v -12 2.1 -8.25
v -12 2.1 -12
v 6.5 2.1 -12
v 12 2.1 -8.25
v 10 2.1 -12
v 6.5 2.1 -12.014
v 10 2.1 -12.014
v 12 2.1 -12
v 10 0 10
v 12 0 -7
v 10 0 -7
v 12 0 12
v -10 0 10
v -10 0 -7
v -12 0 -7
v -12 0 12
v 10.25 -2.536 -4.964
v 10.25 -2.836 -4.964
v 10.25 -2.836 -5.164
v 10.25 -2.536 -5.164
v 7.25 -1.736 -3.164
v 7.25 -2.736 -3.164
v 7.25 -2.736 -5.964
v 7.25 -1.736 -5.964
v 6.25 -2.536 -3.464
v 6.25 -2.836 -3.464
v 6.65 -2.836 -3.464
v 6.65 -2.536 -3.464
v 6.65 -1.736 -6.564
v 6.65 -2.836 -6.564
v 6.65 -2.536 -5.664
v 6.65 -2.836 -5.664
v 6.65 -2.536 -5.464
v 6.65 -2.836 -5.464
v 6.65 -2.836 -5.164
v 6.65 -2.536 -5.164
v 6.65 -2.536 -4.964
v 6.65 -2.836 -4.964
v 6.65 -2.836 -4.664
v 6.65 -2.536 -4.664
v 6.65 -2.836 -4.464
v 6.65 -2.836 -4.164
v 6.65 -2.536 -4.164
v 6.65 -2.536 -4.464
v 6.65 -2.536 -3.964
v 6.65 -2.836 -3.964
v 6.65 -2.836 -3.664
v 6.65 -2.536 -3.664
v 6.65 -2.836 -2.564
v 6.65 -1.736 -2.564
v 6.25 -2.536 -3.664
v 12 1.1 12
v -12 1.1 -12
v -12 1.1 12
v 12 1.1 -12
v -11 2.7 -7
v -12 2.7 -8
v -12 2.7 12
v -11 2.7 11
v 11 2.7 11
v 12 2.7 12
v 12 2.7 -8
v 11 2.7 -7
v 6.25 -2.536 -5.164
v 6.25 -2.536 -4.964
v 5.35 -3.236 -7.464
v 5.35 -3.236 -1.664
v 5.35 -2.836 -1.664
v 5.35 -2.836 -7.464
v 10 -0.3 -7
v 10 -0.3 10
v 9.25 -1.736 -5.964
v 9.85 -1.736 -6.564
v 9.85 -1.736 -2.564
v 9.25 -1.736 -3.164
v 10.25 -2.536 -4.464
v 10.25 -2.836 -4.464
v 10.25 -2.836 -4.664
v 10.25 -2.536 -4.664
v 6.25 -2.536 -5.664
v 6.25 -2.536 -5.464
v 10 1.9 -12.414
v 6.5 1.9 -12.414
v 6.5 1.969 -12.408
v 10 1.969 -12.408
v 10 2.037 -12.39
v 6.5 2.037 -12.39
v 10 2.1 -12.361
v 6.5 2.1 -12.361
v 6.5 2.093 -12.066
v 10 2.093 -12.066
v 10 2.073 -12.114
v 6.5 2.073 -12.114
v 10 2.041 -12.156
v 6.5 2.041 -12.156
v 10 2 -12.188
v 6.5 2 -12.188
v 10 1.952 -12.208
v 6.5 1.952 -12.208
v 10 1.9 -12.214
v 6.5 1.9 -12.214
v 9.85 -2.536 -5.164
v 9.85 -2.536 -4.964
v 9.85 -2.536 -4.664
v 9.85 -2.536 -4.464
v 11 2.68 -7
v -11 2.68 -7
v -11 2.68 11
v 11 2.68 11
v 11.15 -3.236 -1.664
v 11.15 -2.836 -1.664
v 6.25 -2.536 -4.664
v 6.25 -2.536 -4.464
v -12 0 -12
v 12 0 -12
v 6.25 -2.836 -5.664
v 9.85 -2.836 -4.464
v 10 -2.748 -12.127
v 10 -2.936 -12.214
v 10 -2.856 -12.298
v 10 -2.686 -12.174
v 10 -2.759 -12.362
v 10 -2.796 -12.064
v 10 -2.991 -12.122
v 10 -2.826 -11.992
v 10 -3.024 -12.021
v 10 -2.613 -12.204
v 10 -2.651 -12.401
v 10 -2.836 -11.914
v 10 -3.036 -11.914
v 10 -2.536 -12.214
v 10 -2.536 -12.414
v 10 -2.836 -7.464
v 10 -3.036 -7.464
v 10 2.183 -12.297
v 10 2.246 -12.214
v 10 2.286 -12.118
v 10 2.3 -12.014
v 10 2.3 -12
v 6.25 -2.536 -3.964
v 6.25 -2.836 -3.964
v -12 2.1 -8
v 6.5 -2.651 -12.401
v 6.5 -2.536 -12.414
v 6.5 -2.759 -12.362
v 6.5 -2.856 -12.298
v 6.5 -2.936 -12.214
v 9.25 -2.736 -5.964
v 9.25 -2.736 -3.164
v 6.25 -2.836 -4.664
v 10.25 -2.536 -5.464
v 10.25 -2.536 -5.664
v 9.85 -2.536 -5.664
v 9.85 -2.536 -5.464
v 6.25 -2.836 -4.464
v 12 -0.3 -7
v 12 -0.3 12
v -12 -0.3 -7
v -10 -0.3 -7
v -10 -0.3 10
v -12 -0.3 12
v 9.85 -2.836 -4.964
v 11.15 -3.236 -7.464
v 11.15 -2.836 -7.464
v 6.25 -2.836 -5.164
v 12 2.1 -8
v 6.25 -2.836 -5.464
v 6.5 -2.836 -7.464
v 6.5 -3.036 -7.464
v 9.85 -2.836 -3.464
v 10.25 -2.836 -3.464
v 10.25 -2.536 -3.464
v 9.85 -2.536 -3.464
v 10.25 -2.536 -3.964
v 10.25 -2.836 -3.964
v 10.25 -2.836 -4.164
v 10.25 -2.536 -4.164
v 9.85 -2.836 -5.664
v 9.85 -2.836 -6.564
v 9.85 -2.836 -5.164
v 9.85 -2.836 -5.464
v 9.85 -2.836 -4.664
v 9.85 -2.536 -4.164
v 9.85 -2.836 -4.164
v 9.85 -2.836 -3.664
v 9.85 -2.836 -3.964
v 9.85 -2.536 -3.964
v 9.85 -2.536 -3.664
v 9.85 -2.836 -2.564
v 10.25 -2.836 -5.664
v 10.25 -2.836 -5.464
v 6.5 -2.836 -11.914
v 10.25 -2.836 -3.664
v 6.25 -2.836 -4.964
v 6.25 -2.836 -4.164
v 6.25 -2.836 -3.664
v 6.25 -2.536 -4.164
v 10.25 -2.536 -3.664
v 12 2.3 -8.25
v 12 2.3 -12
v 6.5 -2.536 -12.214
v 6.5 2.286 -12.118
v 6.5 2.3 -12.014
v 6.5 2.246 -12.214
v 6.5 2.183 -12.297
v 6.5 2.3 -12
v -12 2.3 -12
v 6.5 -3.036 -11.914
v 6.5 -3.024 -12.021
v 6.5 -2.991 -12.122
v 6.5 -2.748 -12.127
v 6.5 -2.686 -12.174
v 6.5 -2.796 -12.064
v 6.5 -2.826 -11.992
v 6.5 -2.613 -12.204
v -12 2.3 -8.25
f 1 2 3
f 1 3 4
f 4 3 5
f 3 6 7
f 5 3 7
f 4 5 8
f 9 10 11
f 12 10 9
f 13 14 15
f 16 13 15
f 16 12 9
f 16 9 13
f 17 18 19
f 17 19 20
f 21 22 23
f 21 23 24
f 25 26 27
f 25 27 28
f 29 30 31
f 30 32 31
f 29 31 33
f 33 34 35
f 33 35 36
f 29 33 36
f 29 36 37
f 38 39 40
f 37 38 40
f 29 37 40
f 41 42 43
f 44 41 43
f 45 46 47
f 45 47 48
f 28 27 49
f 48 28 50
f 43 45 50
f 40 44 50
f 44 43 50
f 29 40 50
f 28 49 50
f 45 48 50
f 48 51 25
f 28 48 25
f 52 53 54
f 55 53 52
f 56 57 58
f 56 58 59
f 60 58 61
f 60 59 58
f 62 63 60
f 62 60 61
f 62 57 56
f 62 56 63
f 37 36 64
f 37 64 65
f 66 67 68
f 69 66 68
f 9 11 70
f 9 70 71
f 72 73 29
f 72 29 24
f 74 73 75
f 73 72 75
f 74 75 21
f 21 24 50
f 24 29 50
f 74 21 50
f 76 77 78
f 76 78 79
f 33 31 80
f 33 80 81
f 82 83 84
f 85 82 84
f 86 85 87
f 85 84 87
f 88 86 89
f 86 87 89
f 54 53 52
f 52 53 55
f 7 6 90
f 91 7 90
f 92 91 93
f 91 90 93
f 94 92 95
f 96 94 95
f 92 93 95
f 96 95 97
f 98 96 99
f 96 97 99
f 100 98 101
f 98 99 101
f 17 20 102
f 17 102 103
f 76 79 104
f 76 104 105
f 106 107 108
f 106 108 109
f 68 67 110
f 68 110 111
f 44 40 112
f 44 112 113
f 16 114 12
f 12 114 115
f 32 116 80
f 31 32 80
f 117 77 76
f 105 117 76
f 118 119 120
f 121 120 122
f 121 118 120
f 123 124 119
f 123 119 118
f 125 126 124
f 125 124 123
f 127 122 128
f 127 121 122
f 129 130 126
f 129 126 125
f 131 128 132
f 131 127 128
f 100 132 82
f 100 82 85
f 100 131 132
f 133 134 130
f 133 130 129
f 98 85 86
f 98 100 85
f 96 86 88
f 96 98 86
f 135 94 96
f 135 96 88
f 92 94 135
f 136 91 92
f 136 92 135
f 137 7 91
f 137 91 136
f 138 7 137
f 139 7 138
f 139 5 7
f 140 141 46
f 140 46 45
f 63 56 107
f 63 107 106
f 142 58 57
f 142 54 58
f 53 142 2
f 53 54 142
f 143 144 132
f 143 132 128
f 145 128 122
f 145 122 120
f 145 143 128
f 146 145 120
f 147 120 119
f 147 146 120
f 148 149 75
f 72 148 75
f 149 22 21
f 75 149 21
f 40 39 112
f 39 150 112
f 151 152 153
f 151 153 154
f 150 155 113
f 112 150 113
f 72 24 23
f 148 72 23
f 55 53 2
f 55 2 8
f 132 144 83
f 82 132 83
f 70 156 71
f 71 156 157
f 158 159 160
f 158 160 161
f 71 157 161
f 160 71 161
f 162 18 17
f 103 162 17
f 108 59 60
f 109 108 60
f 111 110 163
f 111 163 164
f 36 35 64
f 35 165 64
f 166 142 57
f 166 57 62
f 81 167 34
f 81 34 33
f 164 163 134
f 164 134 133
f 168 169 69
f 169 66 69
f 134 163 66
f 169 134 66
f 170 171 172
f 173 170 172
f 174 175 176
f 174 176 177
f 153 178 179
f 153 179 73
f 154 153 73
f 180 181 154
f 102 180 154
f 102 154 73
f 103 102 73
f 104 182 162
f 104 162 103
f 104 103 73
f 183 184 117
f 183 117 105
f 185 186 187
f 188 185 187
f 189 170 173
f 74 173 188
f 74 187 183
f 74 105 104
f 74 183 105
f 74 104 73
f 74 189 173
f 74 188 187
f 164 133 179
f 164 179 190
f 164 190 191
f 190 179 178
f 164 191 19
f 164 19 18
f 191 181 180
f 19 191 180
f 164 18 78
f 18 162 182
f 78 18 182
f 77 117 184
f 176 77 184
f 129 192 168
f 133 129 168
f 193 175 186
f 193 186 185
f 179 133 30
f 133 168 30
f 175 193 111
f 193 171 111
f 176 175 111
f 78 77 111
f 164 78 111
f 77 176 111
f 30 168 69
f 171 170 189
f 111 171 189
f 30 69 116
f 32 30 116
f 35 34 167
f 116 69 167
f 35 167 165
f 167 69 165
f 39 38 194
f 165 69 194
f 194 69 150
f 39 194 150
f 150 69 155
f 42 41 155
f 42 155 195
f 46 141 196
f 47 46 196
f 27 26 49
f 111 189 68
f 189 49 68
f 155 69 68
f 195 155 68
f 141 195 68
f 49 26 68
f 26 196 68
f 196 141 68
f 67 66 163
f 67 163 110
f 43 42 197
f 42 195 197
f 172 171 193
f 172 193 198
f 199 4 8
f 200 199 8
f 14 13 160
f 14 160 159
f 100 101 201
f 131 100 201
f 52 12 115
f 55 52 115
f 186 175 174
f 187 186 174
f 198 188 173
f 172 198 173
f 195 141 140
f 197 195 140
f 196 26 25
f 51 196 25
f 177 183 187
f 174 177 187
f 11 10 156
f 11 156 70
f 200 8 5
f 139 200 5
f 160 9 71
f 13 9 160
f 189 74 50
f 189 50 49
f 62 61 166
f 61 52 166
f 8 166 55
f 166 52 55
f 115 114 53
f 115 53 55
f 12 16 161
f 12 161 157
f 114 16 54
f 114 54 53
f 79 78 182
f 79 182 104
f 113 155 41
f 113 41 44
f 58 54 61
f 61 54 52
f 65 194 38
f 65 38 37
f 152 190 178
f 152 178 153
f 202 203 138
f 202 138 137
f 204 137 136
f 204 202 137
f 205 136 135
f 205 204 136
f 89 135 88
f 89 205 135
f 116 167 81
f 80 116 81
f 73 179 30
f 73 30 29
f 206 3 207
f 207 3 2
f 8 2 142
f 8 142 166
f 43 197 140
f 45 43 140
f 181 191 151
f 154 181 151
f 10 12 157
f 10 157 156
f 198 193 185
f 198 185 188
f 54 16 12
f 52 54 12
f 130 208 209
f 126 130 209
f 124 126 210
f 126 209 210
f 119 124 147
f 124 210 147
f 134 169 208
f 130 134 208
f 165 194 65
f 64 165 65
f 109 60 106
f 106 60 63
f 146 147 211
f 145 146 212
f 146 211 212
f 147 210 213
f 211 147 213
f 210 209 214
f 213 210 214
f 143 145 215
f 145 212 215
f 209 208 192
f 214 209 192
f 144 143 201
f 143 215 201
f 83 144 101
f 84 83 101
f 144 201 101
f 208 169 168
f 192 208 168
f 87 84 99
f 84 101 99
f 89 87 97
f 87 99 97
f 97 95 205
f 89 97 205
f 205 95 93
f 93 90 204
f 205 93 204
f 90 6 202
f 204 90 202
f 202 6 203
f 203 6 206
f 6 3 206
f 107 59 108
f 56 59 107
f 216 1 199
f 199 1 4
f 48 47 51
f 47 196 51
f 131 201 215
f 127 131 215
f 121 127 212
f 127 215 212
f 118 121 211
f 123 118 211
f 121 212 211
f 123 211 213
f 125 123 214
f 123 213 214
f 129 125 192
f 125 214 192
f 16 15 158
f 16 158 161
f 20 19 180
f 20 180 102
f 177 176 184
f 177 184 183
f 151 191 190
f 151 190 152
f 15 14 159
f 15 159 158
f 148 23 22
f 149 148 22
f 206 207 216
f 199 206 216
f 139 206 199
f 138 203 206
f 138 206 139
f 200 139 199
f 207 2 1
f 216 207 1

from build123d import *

# Parameters (mm, degrees)
SKETCH_1_W                 = 24
SKETCH_1_H                 = 24
EXTRUDE_1_DEPTH            = 1.1
EXTRUDE_START              = 1.1
SKETCH_1_2_W               = 24
SKETCH_1_2_H               = 24
EXTRUDE_2_DEPTH            = 1
SKETCH_2_W                 = 24
SKETCH_2_H                 = 20
EXTRUDE_3_DEPTH            = 0.6
SM_BASE_FLANGE_1_DEPTH     = 0.2
SKETCH_8_W                 = 3.2
SKETCH_8_H                 = 4
EXTRUDE_4_DEPTH            = 1.1
SKETCH_9_W                 = 2
SKETCH_9_H                 = 2.8
CUT_EXTRUDE_1_DEPTH        = 1
SKETCH_18_W                = 5.8
SKETCH_18_H                = 5.8
EXTRUDE_6_DEPTH            = 0.2
SKETCH_19_W                = 0.4
SKETCH_19_H                = 0.2
EXTRUDE_7_DEPTH            = 0.3
SKETCH_17_W                = 22
SKETCH_17_H                = 18
CUT_EXTRUDE_2_DEPTH        = 0.02
EXTRUDE_5_DEPTH            = 0.3
PATTERN_LINEAR_1_COUNT     = 3
PATTERN_LINEAR_1_PITCH     = 0.5
PATTERN_LINEAR_1_COL_COUNT = 3
PATTERN_LINEAR_1_COL_PITCH = 0.5
OTHER_START                = 5.35
OTHER_11_DEPTH             = 5.8
OTHER_START_2              = 6.65
OTHER_11_2_DEPTH           = 3.2
OTHER_11_3_OUTLINE_W       = 5.8
OTHER_11_3_OUTLINE_H       = 0.4
OTHER_11_3_DEPTH           = 5.8
OTHER_11_4_OUTLINE_W       = 2.8
OTHER_11_4_OUTLINE_H       = 1
OTHER_11_4_DEPTH           = 0.6
OTHER_START_3              = 9.25
OTHER_11_5_OUTLINE_W       = 2.8
OTHER_11_5_OUTLINE_H       = 1
OTHER_11_5_DEPTH           = 0.6
OTHER_START_4              = 6.5
OTHER_11_6_OUTLINE_W       = 0.2
OTHER_11_6_OUTLINE_H       = 0.1
OTHER_11_6_DEPTH           = 3.5
OTHER_START_5              = 6.25
OTHER_11_7_OUTLINE_W       = 0.2
OTHER_11_7_OUTLINE_H       = 0.3
OTHER_11_7_DEPTH           = 0.4
OTHER_START_6              = 9.85
OTHER_11_8_OUTLINE_W       = 0.2
OTHER_11_8_OUTLINE_H       = 0.3
OTHER_11_8_DEPTH           = 0.4
OTHER_12_DEPTH             = 5.8
OTHER_12_2_DEPTH           = 3.2
OTHER_12_3_OUTLINE_W       = 0.4
OTHER_12_3_OUTLINE_H       = 5.8
OTHER_12_3_DEPTH           = 5.8
OTHER_12_4_OUTLINE_W       = 1
OTHER_12_4_OUTLINE_H       = 2.8
OTHER_12_4_DEPTH           = 0.6
OTHER_12_5_OUTLINE_W       = 1
OTHER_12_5_OUTLINE_H       = 2.8
OTHER_12_5_DEPTH           = 0.6
OTHER_12_6_OUTLINE_W       = 0.1
OTHER_12_6_OUTLINE_H       = 0.2
OTHER_12_6_DEPTH           = 3.5
OTHER_12_7_OUTLINE_W       = 0.3
OTHER_12_7_OUTLINE_H       = 0.2
OTHER_12_7_DEPTH           = 0.4
OTHER_12_8_OUTLINE_W       = 0.3
OTHER_12_8_OUTLINE_H       = 0.2
OTHER_12_8_DEPTH           = 0.4


# Read off the part's stored shape, not the designer's step: Нарисованный сгиб11, Нарисованный сгиб12
# Sheet-metal steps are written as plain solids
with BuildPart() as part:
    # Sketch 1 → Бобышка-Вытянуть1 (new body)
    with BuildSketch(Plane(origin=(0, 0, 0), x_dir=(1, 0, 0), z_dir=(0, 1, 0))):
        Rectangle(SKETCH_1_W, SKETCH_1_H)
    extrude(amount=EXTRUDE_1_DEPTH)


with BuildPart() as body_2:
    # Эскиз1<2> → Бобышка-Вытянуть2 (new body)
    with BuildSketch(Plane(origin=(0, 0, 0), x_dir=(1, 0, 0), z_dir=(0, 1, 0)).offset(EXTRUDE_START)):
        Rectangle(SKETCH_1_2_W, SKETCH_1_2_H)
    extrude(amount=EXTRUDE_2_DEPTH)

    # Sketch 2 → Бобышка-Вытянуть3 (add)
    with BuildSketch(Plane(origin=(0, 2.1, 0), x_dir=(1, 0, 0), z_dir=(0, 1, 0))):
        with Locations((0, -2)):
            Rectangle(SKETCH_2_W, SKETCH_2_H)
    extrude(amount=EXTRUDE_3_DEPTH)

    # Эскиз17 → Вырез-Вытянуть2 (cut)
    with BuildSketch(Plane(origin=(0, 2.7, 0), x_dir=(1, 0, 0), z_dir=(0, 1, 0))):
        with Locations((0, -2)):
            Rectangle(SKETCH_17_W, SKETCH_17_H)
    extrude(amount=-CUT_EXTRUDE_2_DEPTH, mode=Mode.SUBTRACT)


with BuildPart() as body_3:
    # Эскиз3 → Базовая кромка1 (new body)
    with BuildSketch(Plane(origin=(0, 2.1, 0), x_dir=(1, 0, 0), z_dir=(0, 1, 0))):
        Polygon((-12, 12), (-12, 8.25), (12, 8.25), (12, 12), (10, 12), (10, 22), (11.15, 22), (11.15, 27.8), (5.35, 27.8), (5.35, 22), (6.5, 22), (6.5, 12), align=None)
    extrude(amount=SM_BASE_FLANGE_1_DEPTH)

    # Эскиз8 → Бобышка-Вытянуть4 (add)
    with BuildSketch(Plane.XZ.offset(-2.1)):
        with Locations((8.25, -24.9)):
            Rectangle(SKETCH_8_W, SKETCH_8_H)
    extrude(amount=EXTRUDE_4_DEPTH)

    # Эскиз9 → Вырез-Вытянуть1 (cut)
    with BuildSketch(Plane.XZ.offset(-1)):
        with Locations((8.25, -24.9)):
            Rectangle(SKETCH_9_W, SKETCH_9_H)
    extrude(amount=-CUT_EXTRUDE_1_DEPTH, mode=Mode.SUBTRACT)

    # Эскиз18 → Бобышка-Вытянуть6 (add)
    with BuildSketch(Plane(origin=(0, 2.3, 0), x_dir=(1, 0, 0), z_dir=(0, 1, 0))):
        with Locations((8.25, 24.9)):
            Rectangle(SKETCH_18_W, SKETCH_18_H)
    extrude(amount=EXTRUDE_6_DEPTH)

    # Эскиз19 → Бобышка-Вытянуть7 (add)
    with BuildSketch(Plane.XZ.offset(-2.1)):
        with Locations((6.45, -24.9)):
            Rectangle(SKETCH_19_W, SKETCH_19_H)
        with Locations((10.05, -24.9)):
            Rectangle(SKETCH_19_W, SKETCH_19_H)
    extrude_7 = extrude(amount=EXTRUDE_7_DEPTH)

    # Линейный массив1: Бобышка-Вытянуть7 ×3
    with Locations(*[(0, 0, -i * PATTERN_LINEAR_1_PITCH) for i in range(1, PATTERN_LINEAR_1_COUNT)]):
        add(extrude_7)

    # Линейный массив1 col: Бобышка-Вытянуть7 ×3
    with Locations(*[(0, 0, i * PATTERN_LINEAR_1_COL_PITCH) for i in range(1, PATTERN_LINEAR_1_COL_COUNT)]):
        add(extrude_7)

    # Other 11 outline → Other 11 (cut)
    with BuildSketch(Plane.YZ.offset(OTHER_START)):
        with BuildLine():
            ThreePointArc((2.3, -12.014380551), (2.246410161, -12.21438055), (2.1, -12.360790712))
            Line((2.1, -12.360790712), (2.1, -22.9))
            Line((2.1, -22.9), (1, -22.9))
            Line((1, -22.9), (1, -26.9))
            Line((1, -26.9), (2.1, -26.9))
            Line((2.1, -26.9), (2.1, -27.8))
            Line((2.1, -27.8), (2.5, -27.8))
            Line((2.5, -27.8), (2.5, -22))
            Line((2.5, -22), (2.3, -22))
            Line((2.3, -22), (2.3, -12.014380551))
        make_face()
    extrude(amount=OTHER_11_DEPTH, mode=Mode.SUBTRACT)

    # Other 11 2 outline → Other 11 2 (add)
    with BuildSketch(Plane.YZ.offset(OTHER_START_2)):
        with BuildLine():
            Line((1.9, -12.214380551), (-8.514380551, -12.214380551))
            Line((-8.514380551, -12.214380551), (-8.514380551, -11.114380551))
            Line((-8.514380551, -11.114380551), (-9.114380551, -11.114380551))
            Line((-9.114380551, -11.114380551), (-9.114380551, -12.114380551))
            Line((-9.114380551, -12.114380551), (-11.914380551, -12.114380551))
            Line((-11.914380551, -12.114380551), (-11.914380551, -11.114380551))
            Line((-11.914380551, -11.114380551), (-12.514380551, -11.114380551))
            Line((-12.514380551, -11.114380551), (-12.514380551, -12.214380551))
            Line((-12.514380551, -12.214380551), (-13.414380551, -12.214380551))
            Line((-13.414380551, -12.214380551), (-13.414380551, -12.614380551))
            Line((-13.414380551, -12.614380551), (-7.614380551, -12.614380551))
            Line((-7.614380551, -12.614380551), (-7.614380551, -12.414380551))
            Line((-7.614380551, -12.414380551), (1.9, -12.414380551))
            ThreePointArc((1.9, -12.414380551), (2.003527618, -12.400750881), (2.1, -12.360790712))
            Line((2.1, -12.360790712), (2.1, -12.014380551))
            ThreePointArc((2.1, -12.014380551), (2.041421356, -12.155801907), (1.9, -12.214380551))
        make_face()
    extrude(amount=OTHER_11_2_DEPTH)

    # Other 11 3 outline → Other 11 3 (add)
    with BuildSketch(Plane.YZ.offset(OTHER_START)):
        with Locations((-10.514380551, -12.414380551)):
            Rectangle(OTHER_11_3_OUTLINE_W, OTHER_11_3_OUTLINE_H)
    extrude(amount=OTHER_11_3_DEPTH)

    # Other 11 4 outline → Other 11 4 (add)
    with BuildSketch(Plane.YZ.offset(OTHER_START_2)):
        with Locations((-10.514380551, -11.614380551)):
            Rectangle(OTHER_11_4_OUTLINE_W, OTHER_11_4_OUTLINE_H)
    extrude(amount=OTHER_11_4_DEPTH)

    # Other 11 5 outline → Other 11 5 (add)
    with BuildSketch(Plane.YZ.offset(OTHER_START_3)):
        with Locations((-10.514380551, -11.614380551)):
            Rectangle(OTHER_11_5_OUTLINE_W, OTHER_11_5_OUTLINE_H)
    extrude(amount=OTHER_11_5_DEPTH)

    # Other 11 6 outline → Other 11 6 (add)
    with BuildSketch(Plane.YZ.offset(OTHER_START_4)):
        with BuildLine():
            Line((-7.614380551, -12.214380551), (-7.614380551, -12.414380551))
            Line((-7.614380551, -12.414380551), (1.9, -12.414380551))
            ThreePointArc((1.9, -12.414380551), (2.003527618, -12.400750881), (2.1, -12.360790712))
            Line((2.1, -12.360790712), (2.1, -12.014380551))
            ThreePointArc((2.1, -12.014380551), (2.041421356, -12.155801907), (1.9, -12.214380551))
            Line((1.9, -12.214380551), (-7.614380551, -12.214380551))
        make_face()
        with Locations((-9.514380551, -12.164380551)):
            Rectangle(OTHER_11_6_OUTLINE_W, OTHER_11_6_OUTLINE_H)
        with Locations((-10.014380551, -12.164380551)):
            Rectangle(OTHER_11_6_OUTLINE_W, OTHER_11_6_OUTLINE_H)
        with Locations((-11.514380551, -12.164380551)):
            Rectangle(OTHER_11_6_OUTLINE_W, OTHER_11_6_OUTLINE_H)
        with Locations((-10.514380551, -12.164380551)):
            Rectangle(OTHER_11_6_OUTLINE_W, OTHER_11_6_OUTLINE_H)
        with Locations((-11.014380551, -12.164380551)):
            Rectangle(OTHER_11_6_OUTLINE_W, OTHER_11_6_OUTLINE_H)
    extrude(amount=OTHER_11_6_DEPTH)

    # Other 11 7 outline → Other 11 7 (add)
    with BuildSketch(Plane.YZ.offset(OTHER_START_5)):
        with Locations((-9.514380551, -12.064380551)):
            Rectangle(OTHER_11_7_OUTLINE_W, OTHER_11_7_OUTLINE_H)
        with Locations((-10.014380551, -12.064380551)):
            Rectangle(OTHER_11_7_OUTLINE_W, OTHER_11_7_OUTLINE_H)
        with Locations((-11.514380551, -12.064380551)):
            Rectangle(OTHER_11_7_OUTLINE_W, OTHER_11_7_OUTLINE_H)
        with Locations((-10.514380551, -12.064380551)):
            Rectangle(OTHER_11_7_OUTLINE_W, OTHER_11_7_OUTLINE_H)
        with Locations((-11.014380551, -12.064380551)):
            Rectangle(OTHER_11_7_OUTLINE_W, OTHER_11_7_OUTLINE_H)
    extrude(amount=OTHER_11_7_DEPTH)

    # Other 11 8 outline → Other 11 8 (add)
    with BuildSketch(Plane.YZ.offset(OTHER_START_6)):
        with Locations((-9.514380551, -12.064380551)):
            Rectangle(OTHER_11_8_OUTLINE_W, OTHER_11_8_OUTLINE_H)
        with Locations((-10.014380551, -12.064380551)):
            Rectangle(OTHER_11_8_OUTLINE_W, OTHER_11_8_OUTLINE_H)
        with Locations((-11.514380551, -12.064380551)):
            Rectangle(OTHER_11_8_OUTLINE_W, OTHER_11_8_OUTLINE_H)
        with Locations((-10.514380551, -12.064380551)):
            Rectangle(OTHER_11_8_OUTLINE_W, OTHER_11_8_OUTLINE_H)
        with Locations((-11.014380551, -12.064380551)):
            Rectangle(OTHER_11_8_OUTLINE_W, OTHER_11_8_OUTLINE_H)
    extrude(amount=OTHER_11_8_DEPTH)

    # Other 12 outline → Other 12 (cut)
    with BuildSketch(Plane.YZ.offset(OTHER_START)):
        with BuildLine():
            ThreePointArc((-2.535840735, -12.414380551), (-2.759447533, -12.361594146), (-2.935840735, -12.214380551))
            Line((-2.935840735, -12.214380551), (-8.514380551, -12.214380551))
            Line((-8.514380551, -12.214380551), (-8.514380551, -11.114380551))
            Line((-8.514380551, -11.114380551), (-12.514380551, -11.114380551))
            Line((-12.514380551, -11.114380551), (-12.514380551, -12.214380551))
            Line((-12.514380551, -12.214380551), (-13.414380551, -12.214380551))
            Line((-13.414380551, -12.214380551), (-13.414380551, -12.614380551))
            Line((-13.414380551, -12.614380551), (-7.614380551, -12.614380551))
            Line((-7.614380551, -12.614380551), (-7.614380551, -12.414380551))
            Line((-7.614380551, -12.414380551), (-2.535840735, -12.414380551))
        make_face()
    extrude(amount=OTHER_12_DEPTH, mode=Mode.SUBTRACT)

    # Other 12 2 outline → Other 12 2 (add)
    with BuildSketch(Plane.YZ.offset(OTHER_START_2)):
        with BuildLine():
            Line((-2.835840735, -11.914380551), (-2.835840735, -6.564159265))
            Line((-2.835840735, -6.564159265), (-1.735840735, -6.564159265))
            Line((-1.735840735, -6.564159265), (-1.735840735, -5.964159265))
            Line((-1.735840735, -5.964159265), (-2.735840735, -5.964159265))
            Line((-2.735840735, -5.964159265), (-2.735840735, -3.164159265))
            Line((-2.735840735, -3.164159265), (-1.735840735, -3.164159265))
            Line((-1.735840735, -3.164159265), (-1.735840735, -2.564159265))
            Line((-1.735840735, -2.564159265), (-2.835840735, -2.564159265))
            Line((-2.835840735, -2.564159265), (-2.835840735, -1.664159265))
            Line((-2.835840735, -1.664159265), (-3.235840735, -1.664159265))
            Line((-3.235840735, -1.664159265), (-3.235840735, -7.464159265))
            Line((-3.235840735, -7.464159265), (-3.035840735, -7.464159265))
            Line((-3.035840735, -7.464159265), (-3.035840735, -11.914380551))
            ThreePointArc((-3.035840735, -11.914380551), (-3.010182384, -12.072494434), (-2.935840735, -12.214380551))
            Line((-2.935840735, -12.214380551), (-2.535840735, -12.214380551))
            ThreePointArc((-2.535840735, -12.214380551), (-2.747972769, -12.126512585), (-2.835840735, -11.914380551))
        make_face()
    extrude(amount=OTHER_12_2_DEPTH)

    # Other 12 3 outline → Other 12 3 (add)
    with BuildSketch(Plane.YZ.offset(OTHER_START)):
        with Locations((-3.035840735, -4.564159265)):
            Rectangle(OTHER_12_3_OUTLINE_W, OTHER_12_3_OUTLINE_H)
    extrude(amount=OTHER_12_3_DEPTH)

    # Other 12 4 outline → Other 12 4 (add)
    with BuildSketch(Plane.YZ.offset(OTHER_START_2)):
        with Locations((-2.235840735, -4.564159265)):
            Rectangle(OTHER_12_4_OUTLINE_W, OTHER_12_4_OUTLINE_H)
    extrude(amount=OTHER_12_4_DEPTH)

    # Other 12 5 outline → Other 12 5 (add)
    with BuildSketch(Plane.YZ.offset(OTHER_START_3)):
        with Locations((-2.235840735, -4.564159265)):
            Rectangle(OTHER_12_5_OUTLINE_W, OTHER_12_5_OUTLINE_H)
    extrude(amount=OTHER_12_5_DEPTH)

    # Other 12 6 outline → Other 12 6 (add)
    with BuildSketch(Plane.YZ.offset(OTHER_START_4)):
        with BuildLine():
            Line((-2.835840735, -7.464159265), (-3.035840735, -7.464159265))
            Line((-3.035840735, -7.464159265), (-3.035840735, -11.914380551))
            ThreePointArc((-3.035840735, -11.914380551), (-3.010182384, -12.072494434), (-2.935840735, -12.214380551))
            Line((-2.935840735, -12.214380551), (-2.535840735, -12.214380551))
            ThreePointArc((-2.535840735, -12.214380551), (-2.747972769, -12.126512585), (-2.835840735, -11.914380551))
            Line((-2.835840735, -11.914380551), (-2.835840735, -7.464159265))
        make_face()
        with Locations((-2.785840735, -5.564159265)):
            Rectangle(OTHER_12_6_OUTLINE_W, OTHER_12_6_OUTLINE_H)
        with Locations((-2.785840735, -5.064159265)):
            Rectangle(OTHER_12_6_OUTLINE_W, OTHER_12_6_OUTLINE_H)
        with Locations((-2.785840735, -3.564159265)):
            Rectangle(OTHER_12_6_OUTLINE_W, OTHER_12_6_OUTLINE_H)
        with Locations((-2.785840735, -4.564159265)):
            Rectangle(OTHER_12_6_OUTLINE_W, OTHER_12_6_OUTLINE_H)
        with Locations((-2.785840735, -4.064159265)):
            Rectangle(OTHER_12_6_OUTLINE_W, OTHER_12_6_OUTLINE_H)
    extrude(amount=OTHER_12_6_DEPTH)

    # Other 12 7 outline → Other 12 7 (add)
    with BuildSketch(Plane.YZ.offset(OTHER_START_5)):
        with Locations((-2.685840735, -5.564159265)):
            Rectangle(OTHER_12_7_OUTLINE_W, OTHER_12_7_OUTLINE_H)
        with Locations((-2.685840735, -5.064159265)):
            Rectangle(OTHER_12_7_OUTLINE_W, OTHER_12_7_OUTLINE_H)
        with Locations((-2.685840735, -3.564159265)):
            Rectangle(OTHER_12_7_OUTLINE_W, OTHER_12_7_OUTLINE_H)
        with Locations((-2.685840735, -4.564159265)):
            Rectangle(OTHER_12_7_OUTLINE_W, OTHER_12_7_OUTLINE_H)
        with Locations((-2.685840735, -4.064159265)):
            Rectangle(OTHER_12_7_OUTLINE_W, OTHER_12_7_OUTLINE_H)
    extrude(amount=OTHER_12_7_DEPTH)

    # Other 12 8 outline → Other 12 8 (add)
    with BuildSketch(Plane.YZ.offset(OTHER_START_6)):
        with Locations((-2.685840735, -5.564159265)):
            Rectangle(OTHER_12_8_OUTLINE_W, OTHER_12_8_OUTLINE_H)
        with Locations((-2.685840735, -5.064159265)):
            Rectangle(OTHER_12_8_OUTLINE_W, OTHER_12_8_OUTLINE_H)
        with Locations((-2.685840735, -3.564159265)):
            Rectangle(OTHER_12_8_OUTLINE_W, OTHER_12_8_OUTLINE_H)
        with Locations((-2.685840735, -4.564159265)):
            Rectangle(OTHER_12_8_OUTLINE_W, OTHER_12_8_OUTLINE_H)
        with Locations((-2.685840735, -4.064159265)):
            Rectangle(OTHER_12_8_OUTLINE_W, OTHER_12_8_OUTLINE_H)
    extrude(amount=OTHER_12_8_DEPTH)


with BuildPart() as body_4:
    # Эскиз15 → Бобышка-Вытянуть5 (new body)
    with BuildSketch(Plane.XZ):
        Polygon((-12, -7), (-12, 12), (12, 12), (12, -7), (10, -7), (10, 10), (-10, 10), (-10, -7), align=None)
    extrude(amount=EXTRUDE_5_DEPTH)


solid = Compound([part.part, body_2.part, body_3.part, body_4.part])
